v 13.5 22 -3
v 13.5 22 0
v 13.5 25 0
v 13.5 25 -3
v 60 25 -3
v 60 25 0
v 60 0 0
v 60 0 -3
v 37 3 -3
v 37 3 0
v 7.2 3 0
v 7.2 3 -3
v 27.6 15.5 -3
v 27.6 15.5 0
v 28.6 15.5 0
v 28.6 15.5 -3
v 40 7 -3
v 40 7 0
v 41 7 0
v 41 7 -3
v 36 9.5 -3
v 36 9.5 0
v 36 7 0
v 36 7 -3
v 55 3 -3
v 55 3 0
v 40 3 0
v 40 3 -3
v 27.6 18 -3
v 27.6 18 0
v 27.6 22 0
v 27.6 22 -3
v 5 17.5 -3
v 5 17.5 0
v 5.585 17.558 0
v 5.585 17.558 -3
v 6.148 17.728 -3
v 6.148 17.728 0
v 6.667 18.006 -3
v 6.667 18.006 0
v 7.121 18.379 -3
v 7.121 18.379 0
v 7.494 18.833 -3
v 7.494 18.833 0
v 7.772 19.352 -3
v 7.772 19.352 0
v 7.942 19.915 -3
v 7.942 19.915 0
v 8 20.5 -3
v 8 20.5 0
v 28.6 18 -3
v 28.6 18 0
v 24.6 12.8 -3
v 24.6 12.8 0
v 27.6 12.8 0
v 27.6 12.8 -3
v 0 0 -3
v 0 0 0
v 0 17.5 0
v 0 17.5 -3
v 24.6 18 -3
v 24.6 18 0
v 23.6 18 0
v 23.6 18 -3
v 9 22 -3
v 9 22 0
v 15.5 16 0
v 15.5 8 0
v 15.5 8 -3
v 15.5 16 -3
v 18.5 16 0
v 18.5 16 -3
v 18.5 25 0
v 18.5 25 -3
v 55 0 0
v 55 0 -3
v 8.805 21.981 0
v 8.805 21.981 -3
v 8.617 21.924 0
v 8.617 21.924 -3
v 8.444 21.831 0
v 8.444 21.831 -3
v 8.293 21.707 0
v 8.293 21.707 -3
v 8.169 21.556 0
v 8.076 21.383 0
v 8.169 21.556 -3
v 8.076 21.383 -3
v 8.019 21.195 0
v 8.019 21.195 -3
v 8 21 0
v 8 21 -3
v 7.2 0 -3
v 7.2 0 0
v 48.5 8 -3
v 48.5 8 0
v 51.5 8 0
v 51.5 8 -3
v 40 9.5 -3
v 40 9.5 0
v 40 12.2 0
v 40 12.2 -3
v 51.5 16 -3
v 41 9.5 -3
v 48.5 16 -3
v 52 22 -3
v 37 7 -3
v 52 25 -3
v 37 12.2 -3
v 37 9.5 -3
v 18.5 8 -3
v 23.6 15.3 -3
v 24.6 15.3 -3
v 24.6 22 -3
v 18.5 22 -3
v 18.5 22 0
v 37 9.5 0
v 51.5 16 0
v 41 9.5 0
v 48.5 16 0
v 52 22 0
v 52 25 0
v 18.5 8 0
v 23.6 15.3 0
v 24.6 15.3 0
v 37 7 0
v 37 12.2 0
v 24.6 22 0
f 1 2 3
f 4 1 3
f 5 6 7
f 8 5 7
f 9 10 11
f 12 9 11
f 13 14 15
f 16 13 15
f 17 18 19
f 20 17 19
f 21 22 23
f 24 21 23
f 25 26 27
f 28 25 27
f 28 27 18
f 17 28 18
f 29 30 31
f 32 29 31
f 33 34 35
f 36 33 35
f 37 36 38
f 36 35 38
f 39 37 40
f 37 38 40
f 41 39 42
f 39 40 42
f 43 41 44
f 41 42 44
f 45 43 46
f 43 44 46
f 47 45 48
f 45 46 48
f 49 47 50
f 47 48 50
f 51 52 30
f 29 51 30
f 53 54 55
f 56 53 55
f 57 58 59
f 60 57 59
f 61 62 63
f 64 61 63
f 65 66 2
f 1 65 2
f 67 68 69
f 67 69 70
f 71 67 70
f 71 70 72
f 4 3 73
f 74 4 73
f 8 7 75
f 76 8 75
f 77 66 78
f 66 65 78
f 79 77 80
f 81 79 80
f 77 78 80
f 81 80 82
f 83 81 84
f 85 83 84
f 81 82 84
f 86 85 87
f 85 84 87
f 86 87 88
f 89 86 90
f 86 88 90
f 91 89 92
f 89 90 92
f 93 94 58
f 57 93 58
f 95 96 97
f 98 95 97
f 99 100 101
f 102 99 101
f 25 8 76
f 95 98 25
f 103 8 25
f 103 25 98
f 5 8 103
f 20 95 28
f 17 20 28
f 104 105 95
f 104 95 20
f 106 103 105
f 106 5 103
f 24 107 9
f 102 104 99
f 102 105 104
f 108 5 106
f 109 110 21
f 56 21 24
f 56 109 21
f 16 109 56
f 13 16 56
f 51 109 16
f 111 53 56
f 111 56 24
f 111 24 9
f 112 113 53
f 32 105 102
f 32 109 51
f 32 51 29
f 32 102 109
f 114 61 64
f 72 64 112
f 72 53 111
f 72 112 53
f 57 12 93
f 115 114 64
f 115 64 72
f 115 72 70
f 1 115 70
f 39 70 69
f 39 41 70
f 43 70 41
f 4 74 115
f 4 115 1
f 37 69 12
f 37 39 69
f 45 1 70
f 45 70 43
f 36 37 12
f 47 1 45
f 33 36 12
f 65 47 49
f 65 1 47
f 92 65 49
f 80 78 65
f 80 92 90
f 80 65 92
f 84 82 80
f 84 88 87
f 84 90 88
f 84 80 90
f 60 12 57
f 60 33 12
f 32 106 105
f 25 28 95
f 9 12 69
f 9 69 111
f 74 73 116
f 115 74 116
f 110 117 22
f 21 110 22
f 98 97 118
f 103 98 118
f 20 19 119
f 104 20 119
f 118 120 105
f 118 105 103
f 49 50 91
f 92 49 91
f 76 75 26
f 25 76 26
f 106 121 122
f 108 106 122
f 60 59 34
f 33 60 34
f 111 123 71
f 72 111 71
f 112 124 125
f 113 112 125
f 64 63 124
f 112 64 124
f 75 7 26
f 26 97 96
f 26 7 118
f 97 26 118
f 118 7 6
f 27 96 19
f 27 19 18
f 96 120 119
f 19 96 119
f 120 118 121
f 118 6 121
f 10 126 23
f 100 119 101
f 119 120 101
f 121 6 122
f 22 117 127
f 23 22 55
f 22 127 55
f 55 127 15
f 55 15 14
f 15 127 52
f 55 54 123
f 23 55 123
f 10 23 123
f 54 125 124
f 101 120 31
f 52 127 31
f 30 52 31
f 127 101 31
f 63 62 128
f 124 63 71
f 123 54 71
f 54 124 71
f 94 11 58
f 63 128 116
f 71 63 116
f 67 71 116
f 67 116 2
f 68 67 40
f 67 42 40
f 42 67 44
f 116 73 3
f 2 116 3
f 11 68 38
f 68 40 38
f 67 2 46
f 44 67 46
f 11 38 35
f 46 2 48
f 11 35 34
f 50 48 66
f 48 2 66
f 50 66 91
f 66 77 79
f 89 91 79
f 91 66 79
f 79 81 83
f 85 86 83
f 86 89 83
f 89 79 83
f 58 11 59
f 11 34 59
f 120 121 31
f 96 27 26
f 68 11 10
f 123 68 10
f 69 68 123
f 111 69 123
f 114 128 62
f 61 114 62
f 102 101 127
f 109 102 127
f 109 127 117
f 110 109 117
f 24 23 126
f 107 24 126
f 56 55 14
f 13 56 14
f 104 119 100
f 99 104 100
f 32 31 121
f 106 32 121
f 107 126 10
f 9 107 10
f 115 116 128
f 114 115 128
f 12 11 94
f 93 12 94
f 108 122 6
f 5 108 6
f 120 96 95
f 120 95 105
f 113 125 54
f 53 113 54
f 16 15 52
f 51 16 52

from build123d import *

# Parameters (mm, degrees)
ESQUISSE1_W               = 3
ESQUISSE1_H               = 8
T_LE_DE_BASE_PLI_E1_DEPTH = 3
CONG_1_R                  = 1


# Sheet-metal steps are written as plain solids
with BuildPart() as part:
    # Esquisse1 → Tôle de base pliée1 (new body)
    with BuildSketch(Plane.XY):
        with BuildLine():
            Line((60, 25), (60, 0))
            Line((60, 0), (55, 0))
            Line((55, 0), (55, 3))
            Line((55, 3), (40, 3))
            Line((40, 3), (40, 7))
            Line((40, 7), (41, 7))
            Line((41, 7), (41, 9.5))
            Line((41, 9.5), (40, 9.5))
            Line((40, 9.5), (40, 12.2))
            Line((40, 12.2), (37, 12.2))
            Line((37, 12.2), (37, 9.5))
            Line((37, 9.5), (36, 9.5))
            Line((36, 9.5), (36, 7))
            Line((36, 7), (37, 7))
            Line((37, 7), (37, 3))
            Line((37, 3), (7.2, 3))
            Line((7.2, 3), (7.2, 0))
            Line((7.2, 0), (0, 0))
            Line((0, 0), (0, 17.5))
            Line((0, 17.5), (5, 17.5))
            ThreePointArc((5, 17.5), (7.121320344, 18.378679656), (8, 20.5))
            Line((8, 20.5), (8, 22))
            Line((8, 22), (13.5, 22))
            Line((13.5, 22), (13.5, 25))
            Line((13.5, 25), (18.5, 25))
            Line((18.5, 25), (18.5, 22))
            Line((18.5, 22), (24.6, 22))
            Line((24.6, 22), (24.6, 18))
            Line((24.6, 18), (23.6, 18))
            Line((23.6, 18), (23.6, 15.3))
            Line((23.6, 15.3), (24.6, 15.3))
            Line((24.6, 15.3), (24.6, 12.8))
            Line((24.6, 12.8), (27.6, 12.8))
            Line((27.6, 12.8), (27.6, 15.5))
            Line((27.6, 15.5), (28.6, 15.5))
            Line((28.6, 15.5), (28.6, 18))
            Line((28.6, 18), (27.6, 18))
            Line((27.6, 18), (27.6, 22))
            Line((27.6, 22), (52, 22))
            Line((52, 22), (52, 25))
            Line((52, 25), (60, 25))
        make_face()
        with Locations((17, 12)):
            Rectangle(ESQUISSE1_W, ESQUISSE1_H, mode=Mode.SUBTRACT)
        with Locations((50, 12)):
            Rectangle(ESQUISSE1_W, ESQUISSE1_H, mode=Mode.SUBTRACT)
    extrude(amount=-T_LE_DE_BASE_PLI_E1_DEPTH)

    # Congé1
    cong_1_edges = [part.edges().sort_by_distance(p)[0] for p in [
        (8, 22, -1.5),
    ]]
    fillet(cong_1_edges, radius=CONG_1_R)


solid = part.part
